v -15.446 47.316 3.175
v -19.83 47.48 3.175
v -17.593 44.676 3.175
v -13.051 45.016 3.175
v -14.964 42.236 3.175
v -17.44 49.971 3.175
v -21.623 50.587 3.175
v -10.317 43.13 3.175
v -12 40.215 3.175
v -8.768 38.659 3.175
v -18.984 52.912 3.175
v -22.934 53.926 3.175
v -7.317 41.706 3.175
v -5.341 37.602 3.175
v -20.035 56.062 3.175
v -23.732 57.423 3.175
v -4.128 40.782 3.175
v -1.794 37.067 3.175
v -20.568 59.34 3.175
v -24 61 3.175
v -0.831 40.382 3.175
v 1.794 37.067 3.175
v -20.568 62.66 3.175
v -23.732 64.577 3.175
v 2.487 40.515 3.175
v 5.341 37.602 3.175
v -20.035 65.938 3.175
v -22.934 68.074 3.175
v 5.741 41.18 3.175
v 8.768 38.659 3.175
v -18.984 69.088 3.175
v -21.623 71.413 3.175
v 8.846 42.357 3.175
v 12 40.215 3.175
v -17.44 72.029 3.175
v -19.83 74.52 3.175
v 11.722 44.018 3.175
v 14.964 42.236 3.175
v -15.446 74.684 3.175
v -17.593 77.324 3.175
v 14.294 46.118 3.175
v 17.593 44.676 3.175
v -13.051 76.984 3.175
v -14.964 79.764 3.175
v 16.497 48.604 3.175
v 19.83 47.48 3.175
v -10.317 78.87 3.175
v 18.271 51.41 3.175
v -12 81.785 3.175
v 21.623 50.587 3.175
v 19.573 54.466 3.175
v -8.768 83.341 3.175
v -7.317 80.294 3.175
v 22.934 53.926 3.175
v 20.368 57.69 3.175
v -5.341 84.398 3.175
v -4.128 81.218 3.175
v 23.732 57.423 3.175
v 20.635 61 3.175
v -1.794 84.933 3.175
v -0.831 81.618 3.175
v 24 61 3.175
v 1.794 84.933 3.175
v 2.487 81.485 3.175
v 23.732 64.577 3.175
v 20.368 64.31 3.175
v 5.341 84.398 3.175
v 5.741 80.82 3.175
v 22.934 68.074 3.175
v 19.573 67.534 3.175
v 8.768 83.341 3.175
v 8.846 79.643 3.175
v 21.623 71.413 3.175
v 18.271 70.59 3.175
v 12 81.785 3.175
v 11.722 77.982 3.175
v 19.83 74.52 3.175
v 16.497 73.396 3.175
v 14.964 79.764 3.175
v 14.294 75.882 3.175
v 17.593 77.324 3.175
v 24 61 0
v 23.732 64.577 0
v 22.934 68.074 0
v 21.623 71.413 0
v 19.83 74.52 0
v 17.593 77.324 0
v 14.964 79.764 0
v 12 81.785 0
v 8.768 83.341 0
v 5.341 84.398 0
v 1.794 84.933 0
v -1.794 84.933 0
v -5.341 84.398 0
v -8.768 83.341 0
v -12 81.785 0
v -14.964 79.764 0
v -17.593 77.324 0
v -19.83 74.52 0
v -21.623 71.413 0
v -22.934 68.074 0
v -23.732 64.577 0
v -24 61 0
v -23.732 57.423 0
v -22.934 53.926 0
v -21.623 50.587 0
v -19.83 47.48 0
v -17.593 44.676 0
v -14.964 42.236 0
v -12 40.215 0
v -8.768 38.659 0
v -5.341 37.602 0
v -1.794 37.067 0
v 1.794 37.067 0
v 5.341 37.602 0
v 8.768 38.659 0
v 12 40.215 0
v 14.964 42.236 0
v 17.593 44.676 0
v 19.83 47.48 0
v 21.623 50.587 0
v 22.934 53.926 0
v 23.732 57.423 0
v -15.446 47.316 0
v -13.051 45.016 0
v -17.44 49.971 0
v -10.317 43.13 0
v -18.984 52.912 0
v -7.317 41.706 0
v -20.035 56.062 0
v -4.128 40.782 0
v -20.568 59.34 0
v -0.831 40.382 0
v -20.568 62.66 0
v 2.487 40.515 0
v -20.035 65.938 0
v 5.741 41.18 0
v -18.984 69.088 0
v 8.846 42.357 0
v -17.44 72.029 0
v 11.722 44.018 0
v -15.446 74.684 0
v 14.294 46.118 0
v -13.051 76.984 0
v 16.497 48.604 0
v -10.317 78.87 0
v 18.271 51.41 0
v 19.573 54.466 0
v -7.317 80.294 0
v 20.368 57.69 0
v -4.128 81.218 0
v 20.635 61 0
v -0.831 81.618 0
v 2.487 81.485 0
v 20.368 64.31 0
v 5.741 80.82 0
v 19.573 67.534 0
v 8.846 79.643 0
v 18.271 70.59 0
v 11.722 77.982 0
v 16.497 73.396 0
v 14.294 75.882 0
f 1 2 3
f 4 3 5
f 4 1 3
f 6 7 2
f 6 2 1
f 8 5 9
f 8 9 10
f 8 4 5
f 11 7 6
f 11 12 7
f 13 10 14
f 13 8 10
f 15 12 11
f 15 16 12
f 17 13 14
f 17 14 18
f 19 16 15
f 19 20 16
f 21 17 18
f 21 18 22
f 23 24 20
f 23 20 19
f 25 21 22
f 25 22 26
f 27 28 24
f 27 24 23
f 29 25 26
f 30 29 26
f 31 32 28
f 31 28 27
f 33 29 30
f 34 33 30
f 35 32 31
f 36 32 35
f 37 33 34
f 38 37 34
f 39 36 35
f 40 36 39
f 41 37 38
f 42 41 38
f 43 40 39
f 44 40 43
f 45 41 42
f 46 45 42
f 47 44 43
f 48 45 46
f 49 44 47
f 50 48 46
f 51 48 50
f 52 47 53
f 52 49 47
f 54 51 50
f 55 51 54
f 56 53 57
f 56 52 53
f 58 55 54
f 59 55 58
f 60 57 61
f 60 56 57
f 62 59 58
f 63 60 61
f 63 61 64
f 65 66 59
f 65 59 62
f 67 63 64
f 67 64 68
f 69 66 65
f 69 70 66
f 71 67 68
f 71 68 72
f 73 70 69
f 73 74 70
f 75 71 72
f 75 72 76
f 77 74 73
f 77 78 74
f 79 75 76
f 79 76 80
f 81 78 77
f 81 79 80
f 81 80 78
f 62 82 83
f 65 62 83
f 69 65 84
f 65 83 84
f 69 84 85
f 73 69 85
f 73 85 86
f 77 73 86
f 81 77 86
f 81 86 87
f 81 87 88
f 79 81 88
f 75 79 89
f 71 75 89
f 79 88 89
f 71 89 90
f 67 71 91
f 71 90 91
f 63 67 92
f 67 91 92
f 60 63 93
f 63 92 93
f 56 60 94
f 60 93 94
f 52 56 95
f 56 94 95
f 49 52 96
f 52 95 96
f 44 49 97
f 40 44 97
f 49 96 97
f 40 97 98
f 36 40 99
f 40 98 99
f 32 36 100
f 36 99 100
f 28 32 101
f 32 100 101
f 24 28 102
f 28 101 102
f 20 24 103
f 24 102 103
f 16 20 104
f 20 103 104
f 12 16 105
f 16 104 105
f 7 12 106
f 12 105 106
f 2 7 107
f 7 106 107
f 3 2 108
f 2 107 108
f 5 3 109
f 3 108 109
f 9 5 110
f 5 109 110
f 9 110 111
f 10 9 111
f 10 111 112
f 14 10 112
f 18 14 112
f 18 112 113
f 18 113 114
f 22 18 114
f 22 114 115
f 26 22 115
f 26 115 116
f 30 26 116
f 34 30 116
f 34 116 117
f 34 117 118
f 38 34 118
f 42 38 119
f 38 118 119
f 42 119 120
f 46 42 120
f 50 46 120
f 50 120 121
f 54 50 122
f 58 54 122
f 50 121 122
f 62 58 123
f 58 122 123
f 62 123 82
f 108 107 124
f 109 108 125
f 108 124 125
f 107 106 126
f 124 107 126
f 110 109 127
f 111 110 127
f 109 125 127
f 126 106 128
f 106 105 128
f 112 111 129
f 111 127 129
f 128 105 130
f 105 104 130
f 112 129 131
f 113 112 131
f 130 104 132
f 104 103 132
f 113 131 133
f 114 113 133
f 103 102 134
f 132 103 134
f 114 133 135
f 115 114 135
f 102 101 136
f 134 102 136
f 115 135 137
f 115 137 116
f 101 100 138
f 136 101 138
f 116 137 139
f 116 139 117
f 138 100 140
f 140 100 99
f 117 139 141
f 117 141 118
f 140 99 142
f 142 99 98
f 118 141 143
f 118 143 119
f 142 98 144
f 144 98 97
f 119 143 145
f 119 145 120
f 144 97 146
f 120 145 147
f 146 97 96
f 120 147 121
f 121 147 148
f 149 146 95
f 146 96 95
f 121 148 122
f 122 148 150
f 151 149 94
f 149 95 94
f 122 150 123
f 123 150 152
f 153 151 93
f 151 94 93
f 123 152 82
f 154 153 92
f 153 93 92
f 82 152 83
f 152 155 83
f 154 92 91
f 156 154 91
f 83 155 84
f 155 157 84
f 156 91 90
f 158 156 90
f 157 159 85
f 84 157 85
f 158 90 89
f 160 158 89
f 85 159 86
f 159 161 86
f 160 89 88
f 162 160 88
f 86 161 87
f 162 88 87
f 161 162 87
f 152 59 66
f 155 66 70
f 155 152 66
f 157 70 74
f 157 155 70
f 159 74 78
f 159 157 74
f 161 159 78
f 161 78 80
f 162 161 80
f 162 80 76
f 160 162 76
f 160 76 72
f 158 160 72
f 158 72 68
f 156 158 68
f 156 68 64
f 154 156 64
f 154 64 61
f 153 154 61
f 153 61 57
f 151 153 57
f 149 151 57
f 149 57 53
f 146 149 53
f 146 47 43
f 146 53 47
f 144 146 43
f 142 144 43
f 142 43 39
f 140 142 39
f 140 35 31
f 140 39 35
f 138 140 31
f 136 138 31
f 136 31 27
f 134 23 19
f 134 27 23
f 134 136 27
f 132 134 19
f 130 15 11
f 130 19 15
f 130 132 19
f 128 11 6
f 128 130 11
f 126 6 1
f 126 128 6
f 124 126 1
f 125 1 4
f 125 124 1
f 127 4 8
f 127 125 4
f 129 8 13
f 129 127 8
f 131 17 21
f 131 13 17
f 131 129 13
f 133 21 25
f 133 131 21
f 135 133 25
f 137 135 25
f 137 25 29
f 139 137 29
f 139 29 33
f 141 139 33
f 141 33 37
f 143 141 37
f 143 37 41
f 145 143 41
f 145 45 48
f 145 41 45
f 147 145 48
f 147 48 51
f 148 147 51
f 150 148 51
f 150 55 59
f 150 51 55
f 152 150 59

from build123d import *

# Parameters (mm, degrees)
CYLINDER158_R     = 20.635
CYLINDER158_DEPTH = 41.275
CYLINDER157_R     = 24
CYLINDER157_DEPTH = 3.175


with BuildPart() as cylinder010:
    # Cylinder158 → Cylinder158 (new body)
    with BuildSketch(Plane.XY):
        Circle(CYLINDER158_R)
    extrude(amount=CYLINDER158_DEPTH)


with BuildPart() as cut020:
    # Cylinder157 → Cylinder157 (new body)
    with BuildSketch(Plane.XY):
        Circle(CYLINDER157_R)
    extrude(amount=CYLINDER157_DEPTH)

    # Cut020: cut Cylinder010
    add(cylinder010.part, mode=Mode.SUBTRACT)


with BuildPart() as cut020_1:
    # Cut020 placement: moved
    add(cut020.part.moved(Location((0, 61, 0))))


solid = cut020_1.part
